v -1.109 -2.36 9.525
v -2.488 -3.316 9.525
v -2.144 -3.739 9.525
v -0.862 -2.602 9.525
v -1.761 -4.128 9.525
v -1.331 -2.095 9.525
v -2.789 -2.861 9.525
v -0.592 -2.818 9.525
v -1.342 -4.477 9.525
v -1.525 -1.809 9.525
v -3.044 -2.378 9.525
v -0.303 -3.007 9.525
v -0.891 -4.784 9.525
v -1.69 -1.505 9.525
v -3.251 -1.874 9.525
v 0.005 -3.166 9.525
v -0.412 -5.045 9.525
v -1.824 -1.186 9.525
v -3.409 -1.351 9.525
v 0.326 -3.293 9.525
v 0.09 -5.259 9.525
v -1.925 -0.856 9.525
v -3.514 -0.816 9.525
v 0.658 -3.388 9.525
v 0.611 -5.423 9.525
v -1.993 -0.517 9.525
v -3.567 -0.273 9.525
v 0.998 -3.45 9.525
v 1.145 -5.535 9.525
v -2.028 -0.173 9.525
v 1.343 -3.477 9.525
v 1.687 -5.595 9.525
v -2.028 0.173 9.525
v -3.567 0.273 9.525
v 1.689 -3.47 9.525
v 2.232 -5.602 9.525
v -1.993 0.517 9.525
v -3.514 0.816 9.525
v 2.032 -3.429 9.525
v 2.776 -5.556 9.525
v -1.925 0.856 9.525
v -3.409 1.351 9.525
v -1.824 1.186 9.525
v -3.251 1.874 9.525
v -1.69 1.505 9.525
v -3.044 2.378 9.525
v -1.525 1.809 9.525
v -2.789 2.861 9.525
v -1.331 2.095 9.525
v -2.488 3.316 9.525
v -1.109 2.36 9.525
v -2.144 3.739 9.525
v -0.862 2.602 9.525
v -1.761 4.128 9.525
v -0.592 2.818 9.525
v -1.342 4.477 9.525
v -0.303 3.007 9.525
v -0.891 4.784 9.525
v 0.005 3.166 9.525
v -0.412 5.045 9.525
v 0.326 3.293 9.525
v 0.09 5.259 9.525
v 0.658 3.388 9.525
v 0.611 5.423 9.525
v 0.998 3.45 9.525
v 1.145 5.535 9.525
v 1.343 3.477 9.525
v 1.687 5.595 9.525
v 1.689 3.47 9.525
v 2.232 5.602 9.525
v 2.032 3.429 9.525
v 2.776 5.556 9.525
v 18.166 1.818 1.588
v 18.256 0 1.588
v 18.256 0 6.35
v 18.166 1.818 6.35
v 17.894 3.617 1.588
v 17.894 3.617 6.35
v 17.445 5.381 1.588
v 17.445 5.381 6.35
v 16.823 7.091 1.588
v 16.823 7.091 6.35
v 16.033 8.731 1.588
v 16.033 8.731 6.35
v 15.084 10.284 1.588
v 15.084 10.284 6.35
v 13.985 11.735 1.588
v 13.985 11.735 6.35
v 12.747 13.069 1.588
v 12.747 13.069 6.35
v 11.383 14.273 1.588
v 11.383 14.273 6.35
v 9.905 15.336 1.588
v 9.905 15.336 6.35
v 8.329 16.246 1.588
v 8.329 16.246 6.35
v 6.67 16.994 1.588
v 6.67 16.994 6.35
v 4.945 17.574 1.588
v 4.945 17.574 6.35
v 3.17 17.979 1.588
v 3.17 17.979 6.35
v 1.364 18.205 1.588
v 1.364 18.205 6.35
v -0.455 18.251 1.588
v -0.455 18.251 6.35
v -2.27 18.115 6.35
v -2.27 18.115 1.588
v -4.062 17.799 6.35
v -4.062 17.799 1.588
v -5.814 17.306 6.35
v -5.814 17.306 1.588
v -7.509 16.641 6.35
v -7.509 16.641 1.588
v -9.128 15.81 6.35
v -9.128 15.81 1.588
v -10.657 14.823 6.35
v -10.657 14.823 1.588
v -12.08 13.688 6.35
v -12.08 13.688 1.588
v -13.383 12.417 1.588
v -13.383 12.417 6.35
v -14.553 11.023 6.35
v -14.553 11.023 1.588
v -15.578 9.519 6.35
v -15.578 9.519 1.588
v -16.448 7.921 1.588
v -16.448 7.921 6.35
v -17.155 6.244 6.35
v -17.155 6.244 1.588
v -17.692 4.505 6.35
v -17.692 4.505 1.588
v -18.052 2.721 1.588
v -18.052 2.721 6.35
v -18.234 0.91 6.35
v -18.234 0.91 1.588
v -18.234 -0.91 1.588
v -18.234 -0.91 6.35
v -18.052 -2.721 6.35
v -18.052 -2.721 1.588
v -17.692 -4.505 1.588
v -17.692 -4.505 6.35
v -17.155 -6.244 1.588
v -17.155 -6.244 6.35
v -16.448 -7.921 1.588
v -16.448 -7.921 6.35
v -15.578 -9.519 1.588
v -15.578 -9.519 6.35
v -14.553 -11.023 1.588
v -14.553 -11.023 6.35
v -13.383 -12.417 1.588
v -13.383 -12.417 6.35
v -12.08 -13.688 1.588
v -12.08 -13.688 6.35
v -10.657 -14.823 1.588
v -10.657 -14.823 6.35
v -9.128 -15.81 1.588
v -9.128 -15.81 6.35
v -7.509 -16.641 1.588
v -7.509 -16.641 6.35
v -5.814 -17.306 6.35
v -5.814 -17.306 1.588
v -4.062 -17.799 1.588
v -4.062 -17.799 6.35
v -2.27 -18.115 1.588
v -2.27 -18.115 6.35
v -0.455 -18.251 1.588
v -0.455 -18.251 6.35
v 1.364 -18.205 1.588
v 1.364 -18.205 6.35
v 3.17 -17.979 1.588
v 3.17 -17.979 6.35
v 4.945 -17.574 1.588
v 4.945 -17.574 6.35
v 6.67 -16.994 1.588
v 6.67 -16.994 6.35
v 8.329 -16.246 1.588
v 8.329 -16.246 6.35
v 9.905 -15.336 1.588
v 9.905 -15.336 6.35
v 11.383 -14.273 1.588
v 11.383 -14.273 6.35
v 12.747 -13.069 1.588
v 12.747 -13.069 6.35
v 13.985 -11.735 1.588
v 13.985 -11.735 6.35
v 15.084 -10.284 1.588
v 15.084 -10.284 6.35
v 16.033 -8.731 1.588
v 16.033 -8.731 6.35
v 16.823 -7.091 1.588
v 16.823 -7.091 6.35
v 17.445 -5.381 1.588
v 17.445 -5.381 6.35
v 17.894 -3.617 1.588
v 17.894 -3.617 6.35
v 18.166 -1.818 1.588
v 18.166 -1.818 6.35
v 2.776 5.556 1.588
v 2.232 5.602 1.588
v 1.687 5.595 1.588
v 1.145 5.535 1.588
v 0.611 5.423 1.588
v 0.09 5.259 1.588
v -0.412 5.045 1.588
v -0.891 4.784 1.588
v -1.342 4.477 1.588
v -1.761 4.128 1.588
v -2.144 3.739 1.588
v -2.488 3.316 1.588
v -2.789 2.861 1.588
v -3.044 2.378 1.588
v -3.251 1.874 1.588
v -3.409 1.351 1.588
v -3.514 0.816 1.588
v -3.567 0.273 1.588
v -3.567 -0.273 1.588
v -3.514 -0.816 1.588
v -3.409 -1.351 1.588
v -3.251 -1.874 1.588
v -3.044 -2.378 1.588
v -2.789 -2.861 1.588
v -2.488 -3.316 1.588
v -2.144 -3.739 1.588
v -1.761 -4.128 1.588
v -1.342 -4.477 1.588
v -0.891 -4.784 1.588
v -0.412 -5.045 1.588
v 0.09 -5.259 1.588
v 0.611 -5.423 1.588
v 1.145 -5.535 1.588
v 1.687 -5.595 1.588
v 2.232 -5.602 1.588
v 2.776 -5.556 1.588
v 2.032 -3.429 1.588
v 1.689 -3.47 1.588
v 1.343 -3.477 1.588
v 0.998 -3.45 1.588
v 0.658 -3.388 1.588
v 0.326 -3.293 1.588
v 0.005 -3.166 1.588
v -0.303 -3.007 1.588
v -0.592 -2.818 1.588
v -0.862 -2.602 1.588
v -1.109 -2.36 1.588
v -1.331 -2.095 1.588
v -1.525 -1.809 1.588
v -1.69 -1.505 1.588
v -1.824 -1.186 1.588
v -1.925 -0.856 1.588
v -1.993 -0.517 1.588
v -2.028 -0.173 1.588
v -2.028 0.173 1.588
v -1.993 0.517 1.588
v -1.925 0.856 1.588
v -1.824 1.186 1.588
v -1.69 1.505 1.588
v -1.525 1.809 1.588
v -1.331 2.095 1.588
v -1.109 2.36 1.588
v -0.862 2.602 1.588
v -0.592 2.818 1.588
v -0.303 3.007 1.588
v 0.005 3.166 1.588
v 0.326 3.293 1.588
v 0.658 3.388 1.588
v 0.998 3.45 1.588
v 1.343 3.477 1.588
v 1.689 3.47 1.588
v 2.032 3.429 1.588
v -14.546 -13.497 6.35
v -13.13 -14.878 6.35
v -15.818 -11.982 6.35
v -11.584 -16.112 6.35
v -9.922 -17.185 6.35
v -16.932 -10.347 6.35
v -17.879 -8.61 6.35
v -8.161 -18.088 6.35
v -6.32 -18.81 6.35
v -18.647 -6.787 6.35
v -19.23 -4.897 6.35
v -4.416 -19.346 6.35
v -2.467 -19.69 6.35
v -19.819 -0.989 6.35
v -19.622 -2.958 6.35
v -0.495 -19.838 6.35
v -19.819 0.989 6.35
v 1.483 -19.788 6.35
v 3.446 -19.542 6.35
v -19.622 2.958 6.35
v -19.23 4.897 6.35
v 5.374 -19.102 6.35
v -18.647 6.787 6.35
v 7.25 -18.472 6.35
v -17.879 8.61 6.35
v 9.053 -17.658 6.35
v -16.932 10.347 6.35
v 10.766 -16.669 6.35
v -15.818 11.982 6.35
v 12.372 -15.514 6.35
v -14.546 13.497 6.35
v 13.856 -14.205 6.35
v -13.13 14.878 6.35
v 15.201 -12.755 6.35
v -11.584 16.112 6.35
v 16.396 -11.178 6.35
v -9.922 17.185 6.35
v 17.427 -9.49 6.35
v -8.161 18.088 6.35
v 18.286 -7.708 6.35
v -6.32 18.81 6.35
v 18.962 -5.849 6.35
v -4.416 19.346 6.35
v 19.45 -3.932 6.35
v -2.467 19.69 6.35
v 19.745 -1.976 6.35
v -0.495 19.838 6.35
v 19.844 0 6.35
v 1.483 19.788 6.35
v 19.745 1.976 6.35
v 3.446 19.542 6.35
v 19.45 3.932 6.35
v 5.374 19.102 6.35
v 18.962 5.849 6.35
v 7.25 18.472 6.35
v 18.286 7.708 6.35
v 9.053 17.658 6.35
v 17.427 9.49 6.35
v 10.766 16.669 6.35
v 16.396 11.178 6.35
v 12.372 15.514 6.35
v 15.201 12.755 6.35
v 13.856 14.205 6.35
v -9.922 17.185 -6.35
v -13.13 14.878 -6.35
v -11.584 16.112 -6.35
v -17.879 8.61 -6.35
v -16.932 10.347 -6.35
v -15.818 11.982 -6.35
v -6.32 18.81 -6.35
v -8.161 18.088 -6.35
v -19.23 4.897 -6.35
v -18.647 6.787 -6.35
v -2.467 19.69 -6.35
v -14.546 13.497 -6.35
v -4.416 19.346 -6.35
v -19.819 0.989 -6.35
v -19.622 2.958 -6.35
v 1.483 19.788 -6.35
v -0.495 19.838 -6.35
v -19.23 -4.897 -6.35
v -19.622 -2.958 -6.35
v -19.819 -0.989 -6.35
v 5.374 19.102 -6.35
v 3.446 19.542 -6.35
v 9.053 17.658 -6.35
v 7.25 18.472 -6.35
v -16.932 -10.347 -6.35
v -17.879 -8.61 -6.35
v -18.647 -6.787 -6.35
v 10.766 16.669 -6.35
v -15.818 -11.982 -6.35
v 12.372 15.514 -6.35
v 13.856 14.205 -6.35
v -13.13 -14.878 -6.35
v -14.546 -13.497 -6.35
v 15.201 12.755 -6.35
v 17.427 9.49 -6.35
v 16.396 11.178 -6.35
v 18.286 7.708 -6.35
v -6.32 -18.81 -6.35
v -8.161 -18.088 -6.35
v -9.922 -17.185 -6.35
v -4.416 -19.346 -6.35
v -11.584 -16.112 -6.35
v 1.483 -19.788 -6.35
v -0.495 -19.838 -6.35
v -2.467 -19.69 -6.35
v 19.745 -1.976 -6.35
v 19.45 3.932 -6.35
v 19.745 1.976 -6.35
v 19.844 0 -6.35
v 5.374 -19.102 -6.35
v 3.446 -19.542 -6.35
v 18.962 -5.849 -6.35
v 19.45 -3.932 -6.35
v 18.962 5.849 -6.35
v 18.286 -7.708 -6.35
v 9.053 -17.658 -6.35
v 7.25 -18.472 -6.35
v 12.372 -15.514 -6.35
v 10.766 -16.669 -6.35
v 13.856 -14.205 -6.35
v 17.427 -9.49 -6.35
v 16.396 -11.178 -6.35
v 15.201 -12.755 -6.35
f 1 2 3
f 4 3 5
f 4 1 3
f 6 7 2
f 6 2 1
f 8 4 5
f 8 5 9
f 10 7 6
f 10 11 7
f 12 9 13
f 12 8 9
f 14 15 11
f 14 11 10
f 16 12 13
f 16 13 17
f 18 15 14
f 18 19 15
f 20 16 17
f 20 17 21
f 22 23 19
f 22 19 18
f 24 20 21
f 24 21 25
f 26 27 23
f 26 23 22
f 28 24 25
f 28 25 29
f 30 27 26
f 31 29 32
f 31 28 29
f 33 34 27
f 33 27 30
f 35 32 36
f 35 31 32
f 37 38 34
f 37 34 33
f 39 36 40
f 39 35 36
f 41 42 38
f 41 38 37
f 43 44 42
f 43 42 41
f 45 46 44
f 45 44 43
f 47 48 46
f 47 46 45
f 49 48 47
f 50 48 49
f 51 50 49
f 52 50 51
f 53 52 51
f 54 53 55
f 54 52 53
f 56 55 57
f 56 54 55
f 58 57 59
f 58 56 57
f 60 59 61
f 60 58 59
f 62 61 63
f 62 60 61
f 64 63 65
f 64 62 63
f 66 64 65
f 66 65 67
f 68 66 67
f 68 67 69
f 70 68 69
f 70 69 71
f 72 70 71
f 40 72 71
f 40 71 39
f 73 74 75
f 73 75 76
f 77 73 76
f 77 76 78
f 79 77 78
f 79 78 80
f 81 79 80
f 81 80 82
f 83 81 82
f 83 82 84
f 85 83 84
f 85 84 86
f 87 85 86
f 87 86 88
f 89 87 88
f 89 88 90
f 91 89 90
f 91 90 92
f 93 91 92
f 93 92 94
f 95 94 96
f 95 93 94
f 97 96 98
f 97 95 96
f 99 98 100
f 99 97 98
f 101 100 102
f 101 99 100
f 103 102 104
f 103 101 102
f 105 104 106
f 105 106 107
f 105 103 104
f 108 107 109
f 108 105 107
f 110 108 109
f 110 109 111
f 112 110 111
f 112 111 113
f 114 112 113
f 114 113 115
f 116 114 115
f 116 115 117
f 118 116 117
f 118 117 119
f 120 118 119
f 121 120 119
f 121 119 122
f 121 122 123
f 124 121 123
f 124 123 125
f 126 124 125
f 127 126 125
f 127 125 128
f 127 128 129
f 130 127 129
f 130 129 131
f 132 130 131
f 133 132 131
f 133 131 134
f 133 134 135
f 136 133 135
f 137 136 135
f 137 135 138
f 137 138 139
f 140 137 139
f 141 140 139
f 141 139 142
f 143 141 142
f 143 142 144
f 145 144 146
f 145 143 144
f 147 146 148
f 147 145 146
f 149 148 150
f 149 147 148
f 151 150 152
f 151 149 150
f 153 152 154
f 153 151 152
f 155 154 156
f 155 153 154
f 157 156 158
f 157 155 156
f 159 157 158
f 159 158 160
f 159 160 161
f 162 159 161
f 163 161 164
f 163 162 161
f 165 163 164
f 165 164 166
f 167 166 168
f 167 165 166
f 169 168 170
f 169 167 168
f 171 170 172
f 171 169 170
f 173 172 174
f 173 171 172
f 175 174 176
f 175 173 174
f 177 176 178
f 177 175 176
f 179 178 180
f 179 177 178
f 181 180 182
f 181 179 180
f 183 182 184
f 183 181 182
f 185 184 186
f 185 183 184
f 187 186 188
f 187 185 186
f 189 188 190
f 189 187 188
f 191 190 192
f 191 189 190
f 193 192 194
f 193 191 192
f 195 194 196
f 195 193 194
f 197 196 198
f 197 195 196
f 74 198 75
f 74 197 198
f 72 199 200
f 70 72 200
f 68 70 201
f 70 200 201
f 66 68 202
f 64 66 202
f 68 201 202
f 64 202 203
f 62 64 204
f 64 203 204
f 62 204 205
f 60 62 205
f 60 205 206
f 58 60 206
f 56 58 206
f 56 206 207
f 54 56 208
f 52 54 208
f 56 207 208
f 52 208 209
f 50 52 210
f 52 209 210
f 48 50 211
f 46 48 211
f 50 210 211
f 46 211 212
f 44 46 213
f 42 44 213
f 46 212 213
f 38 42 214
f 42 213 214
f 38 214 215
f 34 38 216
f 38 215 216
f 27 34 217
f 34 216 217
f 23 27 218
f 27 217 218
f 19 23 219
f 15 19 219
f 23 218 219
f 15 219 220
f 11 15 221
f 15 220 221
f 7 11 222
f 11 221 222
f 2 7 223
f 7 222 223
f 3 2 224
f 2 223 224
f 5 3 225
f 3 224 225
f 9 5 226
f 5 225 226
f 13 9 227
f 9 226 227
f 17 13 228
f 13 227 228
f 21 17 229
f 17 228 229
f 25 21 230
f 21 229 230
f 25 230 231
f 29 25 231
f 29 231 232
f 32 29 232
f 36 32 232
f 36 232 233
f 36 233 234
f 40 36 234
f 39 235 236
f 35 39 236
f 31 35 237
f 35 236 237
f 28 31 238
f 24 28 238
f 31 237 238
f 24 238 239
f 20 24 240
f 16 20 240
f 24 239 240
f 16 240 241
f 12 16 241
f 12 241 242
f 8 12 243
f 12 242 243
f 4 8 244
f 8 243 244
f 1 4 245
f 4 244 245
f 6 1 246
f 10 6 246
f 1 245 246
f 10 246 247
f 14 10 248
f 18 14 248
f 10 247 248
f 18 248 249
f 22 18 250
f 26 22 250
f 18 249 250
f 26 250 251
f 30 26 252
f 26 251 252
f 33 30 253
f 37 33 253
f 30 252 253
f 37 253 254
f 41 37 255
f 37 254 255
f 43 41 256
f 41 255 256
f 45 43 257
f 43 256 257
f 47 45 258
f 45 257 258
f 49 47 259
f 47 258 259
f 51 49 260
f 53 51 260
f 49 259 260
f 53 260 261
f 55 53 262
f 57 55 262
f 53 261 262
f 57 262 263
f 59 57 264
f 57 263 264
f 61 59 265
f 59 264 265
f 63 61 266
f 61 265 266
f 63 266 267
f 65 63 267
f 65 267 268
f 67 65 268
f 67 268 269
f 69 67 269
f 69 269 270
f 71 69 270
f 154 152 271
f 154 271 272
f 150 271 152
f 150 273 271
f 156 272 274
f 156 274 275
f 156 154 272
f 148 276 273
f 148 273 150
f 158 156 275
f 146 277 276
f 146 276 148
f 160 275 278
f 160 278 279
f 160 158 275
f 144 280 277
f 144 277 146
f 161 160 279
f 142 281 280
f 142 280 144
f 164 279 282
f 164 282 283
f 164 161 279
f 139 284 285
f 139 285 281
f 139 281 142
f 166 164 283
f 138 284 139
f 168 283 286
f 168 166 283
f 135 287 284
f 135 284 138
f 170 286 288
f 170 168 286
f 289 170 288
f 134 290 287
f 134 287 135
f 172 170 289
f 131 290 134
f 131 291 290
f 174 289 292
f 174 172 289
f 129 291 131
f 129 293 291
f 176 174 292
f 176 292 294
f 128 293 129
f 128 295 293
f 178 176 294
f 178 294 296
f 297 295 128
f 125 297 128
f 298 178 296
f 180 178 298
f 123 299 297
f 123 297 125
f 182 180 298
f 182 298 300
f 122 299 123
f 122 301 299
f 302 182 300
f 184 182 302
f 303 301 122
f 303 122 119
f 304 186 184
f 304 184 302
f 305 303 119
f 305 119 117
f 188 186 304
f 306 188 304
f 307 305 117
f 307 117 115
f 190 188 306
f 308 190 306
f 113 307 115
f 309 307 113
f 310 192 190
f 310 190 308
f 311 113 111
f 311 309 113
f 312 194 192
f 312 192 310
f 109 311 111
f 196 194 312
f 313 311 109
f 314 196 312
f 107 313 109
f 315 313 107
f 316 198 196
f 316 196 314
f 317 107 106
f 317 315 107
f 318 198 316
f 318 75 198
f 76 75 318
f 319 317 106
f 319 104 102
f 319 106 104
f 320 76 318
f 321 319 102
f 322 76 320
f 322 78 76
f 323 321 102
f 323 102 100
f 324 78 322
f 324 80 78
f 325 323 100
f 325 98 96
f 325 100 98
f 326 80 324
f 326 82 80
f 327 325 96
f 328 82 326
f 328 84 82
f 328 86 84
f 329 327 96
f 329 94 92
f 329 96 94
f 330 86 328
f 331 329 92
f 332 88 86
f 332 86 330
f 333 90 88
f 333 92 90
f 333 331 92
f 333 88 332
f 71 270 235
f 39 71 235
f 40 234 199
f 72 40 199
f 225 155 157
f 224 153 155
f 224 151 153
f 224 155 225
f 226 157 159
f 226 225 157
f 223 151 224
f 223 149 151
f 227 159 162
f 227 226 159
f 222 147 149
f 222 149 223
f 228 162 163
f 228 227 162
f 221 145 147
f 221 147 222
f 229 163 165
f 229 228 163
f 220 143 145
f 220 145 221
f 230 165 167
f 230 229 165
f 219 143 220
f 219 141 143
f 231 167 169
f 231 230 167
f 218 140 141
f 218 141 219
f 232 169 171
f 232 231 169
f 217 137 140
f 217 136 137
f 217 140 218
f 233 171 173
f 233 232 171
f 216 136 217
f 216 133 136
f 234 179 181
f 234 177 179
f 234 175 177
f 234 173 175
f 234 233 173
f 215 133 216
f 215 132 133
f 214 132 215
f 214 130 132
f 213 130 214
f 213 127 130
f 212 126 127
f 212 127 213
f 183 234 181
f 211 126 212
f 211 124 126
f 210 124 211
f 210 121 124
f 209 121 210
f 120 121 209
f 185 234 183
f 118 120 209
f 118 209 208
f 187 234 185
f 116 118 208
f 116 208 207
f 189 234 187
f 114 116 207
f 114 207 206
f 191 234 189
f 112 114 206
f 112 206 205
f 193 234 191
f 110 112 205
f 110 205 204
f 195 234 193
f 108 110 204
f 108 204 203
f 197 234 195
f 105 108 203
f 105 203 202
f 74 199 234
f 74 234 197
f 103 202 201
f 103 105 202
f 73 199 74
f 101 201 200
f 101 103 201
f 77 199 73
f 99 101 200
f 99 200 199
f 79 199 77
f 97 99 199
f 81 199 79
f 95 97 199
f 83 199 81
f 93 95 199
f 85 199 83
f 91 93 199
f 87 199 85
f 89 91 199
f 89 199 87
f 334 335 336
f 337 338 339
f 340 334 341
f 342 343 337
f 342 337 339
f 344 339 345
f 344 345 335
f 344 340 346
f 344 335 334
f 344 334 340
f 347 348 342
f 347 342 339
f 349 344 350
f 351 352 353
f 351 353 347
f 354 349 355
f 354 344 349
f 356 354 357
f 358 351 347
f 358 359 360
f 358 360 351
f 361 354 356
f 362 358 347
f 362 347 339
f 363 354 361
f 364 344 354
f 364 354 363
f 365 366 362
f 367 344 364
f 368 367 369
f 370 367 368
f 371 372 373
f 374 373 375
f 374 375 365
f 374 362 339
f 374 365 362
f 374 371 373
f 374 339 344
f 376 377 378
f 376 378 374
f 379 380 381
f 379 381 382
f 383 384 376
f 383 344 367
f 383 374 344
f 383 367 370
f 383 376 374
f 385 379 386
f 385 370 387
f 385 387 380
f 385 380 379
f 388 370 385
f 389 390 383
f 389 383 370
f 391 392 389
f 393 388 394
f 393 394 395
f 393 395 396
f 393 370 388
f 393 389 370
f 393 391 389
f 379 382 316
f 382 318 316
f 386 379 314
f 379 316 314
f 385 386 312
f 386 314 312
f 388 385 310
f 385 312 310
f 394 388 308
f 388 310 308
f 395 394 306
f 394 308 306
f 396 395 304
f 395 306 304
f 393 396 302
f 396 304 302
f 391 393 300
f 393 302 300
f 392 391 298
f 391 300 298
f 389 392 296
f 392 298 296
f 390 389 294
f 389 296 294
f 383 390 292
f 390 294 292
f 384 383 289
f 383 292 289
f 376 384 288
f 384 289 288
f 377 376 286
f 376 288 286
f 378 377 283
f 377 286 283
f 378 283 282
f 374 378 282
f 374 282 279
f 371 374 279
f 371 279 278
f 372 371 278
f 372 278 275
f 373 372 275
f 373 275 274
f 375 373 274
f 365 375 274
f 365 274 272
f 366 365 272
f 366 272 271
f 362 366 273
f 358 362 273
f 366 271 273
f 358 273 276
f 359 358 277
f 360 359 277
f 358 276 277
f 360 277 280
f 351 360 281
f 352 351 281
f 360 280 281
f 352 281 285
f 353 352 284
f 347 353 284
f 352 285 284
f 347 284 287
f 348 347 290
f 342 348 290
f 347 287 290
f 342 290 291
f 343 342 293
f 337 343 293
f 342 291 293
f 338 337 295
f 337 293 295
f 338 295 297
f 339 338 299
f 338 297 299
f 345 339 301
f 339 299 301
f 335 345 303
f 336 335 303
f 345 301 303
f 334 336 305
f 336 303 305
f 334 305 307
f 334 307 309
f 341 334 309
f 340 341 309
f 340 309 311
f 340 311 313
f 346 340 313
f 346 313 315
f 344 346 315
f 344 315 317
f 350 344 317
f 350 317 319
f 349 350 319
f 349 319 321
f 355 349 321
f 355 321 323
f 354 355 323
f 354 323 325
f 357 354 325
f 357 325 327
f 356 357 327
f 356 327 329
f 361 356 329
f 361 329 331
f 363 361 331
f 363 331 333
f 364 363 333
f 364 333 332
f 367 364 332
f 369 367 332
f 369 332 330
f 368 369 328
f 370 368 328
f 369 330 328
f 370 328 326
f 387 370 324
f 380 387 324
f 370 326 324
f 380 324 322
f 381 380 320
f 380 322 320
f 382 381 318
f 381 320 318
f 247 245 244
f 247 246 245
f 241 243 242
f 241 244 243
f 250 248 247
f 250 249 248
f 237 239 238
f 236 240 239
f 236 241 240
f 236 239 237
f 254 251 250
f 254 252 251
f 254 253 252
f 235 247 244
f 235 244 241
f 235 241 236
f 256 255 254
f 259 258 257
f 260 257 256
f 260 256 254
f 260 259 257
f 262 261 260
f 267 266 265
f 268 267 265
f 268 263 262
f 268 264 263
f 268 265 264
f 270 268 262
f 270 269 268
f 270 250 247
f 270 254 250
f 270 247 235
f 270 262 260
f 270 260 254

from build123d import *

# Parameters (mm, degrees)
F0_R     = 19.84375
F1_DEPTH = 6.35
F2_T     = -1.5875
F4_DEPTH = 7.9375
F6_R     = 19.84375
F7_DEPTH = 6.35


with BuildPart() as f1:
    # F0 (on Top) → F1 (new body)
    with BuildSketch(Plane.XY):
        Circle(F0_R)
    extrude(amount=F1_DEPTH)

    # F2
    f2_openings = [f1.faces().sort_by_distance(p)[0] for p in [
        (0, 0, 6.35),
    ]]
    offset(amount=F2_T, openings=f2_openings)

    # F3 (on face) → F4 (join)
    with BuildSketch(Plane.XY.offset(1.5875)):
        with BuildLine():
            Line((2.776140625, -5.55625), (2.776140625, 5.55625))
            ThreePointArc((2.776140625, 5.55625), (-3.573859375, 0), (2.776140625, -5.55625))
        make_face()
        with BuildLine():
            Line((2.032, 3.429), (2.032, -3.429))
            ThreePointArc((2.032, -3.429), (-2.032, 0), (2.032, 3.429))
        make_face(mode=Mode.SUBTRACT)
    extrude(amount=F4_DEPTH)

    # F6 (on face) → F7 (join)
    with BuildSketch(Plane(origin=(0, 0, 0), x_dir=(1, 0, 0), z_dir=(0, 0, -1))):
        Circle(F6_R)
    extrude(amount=F7_DEPTH)


solid = f1.part
